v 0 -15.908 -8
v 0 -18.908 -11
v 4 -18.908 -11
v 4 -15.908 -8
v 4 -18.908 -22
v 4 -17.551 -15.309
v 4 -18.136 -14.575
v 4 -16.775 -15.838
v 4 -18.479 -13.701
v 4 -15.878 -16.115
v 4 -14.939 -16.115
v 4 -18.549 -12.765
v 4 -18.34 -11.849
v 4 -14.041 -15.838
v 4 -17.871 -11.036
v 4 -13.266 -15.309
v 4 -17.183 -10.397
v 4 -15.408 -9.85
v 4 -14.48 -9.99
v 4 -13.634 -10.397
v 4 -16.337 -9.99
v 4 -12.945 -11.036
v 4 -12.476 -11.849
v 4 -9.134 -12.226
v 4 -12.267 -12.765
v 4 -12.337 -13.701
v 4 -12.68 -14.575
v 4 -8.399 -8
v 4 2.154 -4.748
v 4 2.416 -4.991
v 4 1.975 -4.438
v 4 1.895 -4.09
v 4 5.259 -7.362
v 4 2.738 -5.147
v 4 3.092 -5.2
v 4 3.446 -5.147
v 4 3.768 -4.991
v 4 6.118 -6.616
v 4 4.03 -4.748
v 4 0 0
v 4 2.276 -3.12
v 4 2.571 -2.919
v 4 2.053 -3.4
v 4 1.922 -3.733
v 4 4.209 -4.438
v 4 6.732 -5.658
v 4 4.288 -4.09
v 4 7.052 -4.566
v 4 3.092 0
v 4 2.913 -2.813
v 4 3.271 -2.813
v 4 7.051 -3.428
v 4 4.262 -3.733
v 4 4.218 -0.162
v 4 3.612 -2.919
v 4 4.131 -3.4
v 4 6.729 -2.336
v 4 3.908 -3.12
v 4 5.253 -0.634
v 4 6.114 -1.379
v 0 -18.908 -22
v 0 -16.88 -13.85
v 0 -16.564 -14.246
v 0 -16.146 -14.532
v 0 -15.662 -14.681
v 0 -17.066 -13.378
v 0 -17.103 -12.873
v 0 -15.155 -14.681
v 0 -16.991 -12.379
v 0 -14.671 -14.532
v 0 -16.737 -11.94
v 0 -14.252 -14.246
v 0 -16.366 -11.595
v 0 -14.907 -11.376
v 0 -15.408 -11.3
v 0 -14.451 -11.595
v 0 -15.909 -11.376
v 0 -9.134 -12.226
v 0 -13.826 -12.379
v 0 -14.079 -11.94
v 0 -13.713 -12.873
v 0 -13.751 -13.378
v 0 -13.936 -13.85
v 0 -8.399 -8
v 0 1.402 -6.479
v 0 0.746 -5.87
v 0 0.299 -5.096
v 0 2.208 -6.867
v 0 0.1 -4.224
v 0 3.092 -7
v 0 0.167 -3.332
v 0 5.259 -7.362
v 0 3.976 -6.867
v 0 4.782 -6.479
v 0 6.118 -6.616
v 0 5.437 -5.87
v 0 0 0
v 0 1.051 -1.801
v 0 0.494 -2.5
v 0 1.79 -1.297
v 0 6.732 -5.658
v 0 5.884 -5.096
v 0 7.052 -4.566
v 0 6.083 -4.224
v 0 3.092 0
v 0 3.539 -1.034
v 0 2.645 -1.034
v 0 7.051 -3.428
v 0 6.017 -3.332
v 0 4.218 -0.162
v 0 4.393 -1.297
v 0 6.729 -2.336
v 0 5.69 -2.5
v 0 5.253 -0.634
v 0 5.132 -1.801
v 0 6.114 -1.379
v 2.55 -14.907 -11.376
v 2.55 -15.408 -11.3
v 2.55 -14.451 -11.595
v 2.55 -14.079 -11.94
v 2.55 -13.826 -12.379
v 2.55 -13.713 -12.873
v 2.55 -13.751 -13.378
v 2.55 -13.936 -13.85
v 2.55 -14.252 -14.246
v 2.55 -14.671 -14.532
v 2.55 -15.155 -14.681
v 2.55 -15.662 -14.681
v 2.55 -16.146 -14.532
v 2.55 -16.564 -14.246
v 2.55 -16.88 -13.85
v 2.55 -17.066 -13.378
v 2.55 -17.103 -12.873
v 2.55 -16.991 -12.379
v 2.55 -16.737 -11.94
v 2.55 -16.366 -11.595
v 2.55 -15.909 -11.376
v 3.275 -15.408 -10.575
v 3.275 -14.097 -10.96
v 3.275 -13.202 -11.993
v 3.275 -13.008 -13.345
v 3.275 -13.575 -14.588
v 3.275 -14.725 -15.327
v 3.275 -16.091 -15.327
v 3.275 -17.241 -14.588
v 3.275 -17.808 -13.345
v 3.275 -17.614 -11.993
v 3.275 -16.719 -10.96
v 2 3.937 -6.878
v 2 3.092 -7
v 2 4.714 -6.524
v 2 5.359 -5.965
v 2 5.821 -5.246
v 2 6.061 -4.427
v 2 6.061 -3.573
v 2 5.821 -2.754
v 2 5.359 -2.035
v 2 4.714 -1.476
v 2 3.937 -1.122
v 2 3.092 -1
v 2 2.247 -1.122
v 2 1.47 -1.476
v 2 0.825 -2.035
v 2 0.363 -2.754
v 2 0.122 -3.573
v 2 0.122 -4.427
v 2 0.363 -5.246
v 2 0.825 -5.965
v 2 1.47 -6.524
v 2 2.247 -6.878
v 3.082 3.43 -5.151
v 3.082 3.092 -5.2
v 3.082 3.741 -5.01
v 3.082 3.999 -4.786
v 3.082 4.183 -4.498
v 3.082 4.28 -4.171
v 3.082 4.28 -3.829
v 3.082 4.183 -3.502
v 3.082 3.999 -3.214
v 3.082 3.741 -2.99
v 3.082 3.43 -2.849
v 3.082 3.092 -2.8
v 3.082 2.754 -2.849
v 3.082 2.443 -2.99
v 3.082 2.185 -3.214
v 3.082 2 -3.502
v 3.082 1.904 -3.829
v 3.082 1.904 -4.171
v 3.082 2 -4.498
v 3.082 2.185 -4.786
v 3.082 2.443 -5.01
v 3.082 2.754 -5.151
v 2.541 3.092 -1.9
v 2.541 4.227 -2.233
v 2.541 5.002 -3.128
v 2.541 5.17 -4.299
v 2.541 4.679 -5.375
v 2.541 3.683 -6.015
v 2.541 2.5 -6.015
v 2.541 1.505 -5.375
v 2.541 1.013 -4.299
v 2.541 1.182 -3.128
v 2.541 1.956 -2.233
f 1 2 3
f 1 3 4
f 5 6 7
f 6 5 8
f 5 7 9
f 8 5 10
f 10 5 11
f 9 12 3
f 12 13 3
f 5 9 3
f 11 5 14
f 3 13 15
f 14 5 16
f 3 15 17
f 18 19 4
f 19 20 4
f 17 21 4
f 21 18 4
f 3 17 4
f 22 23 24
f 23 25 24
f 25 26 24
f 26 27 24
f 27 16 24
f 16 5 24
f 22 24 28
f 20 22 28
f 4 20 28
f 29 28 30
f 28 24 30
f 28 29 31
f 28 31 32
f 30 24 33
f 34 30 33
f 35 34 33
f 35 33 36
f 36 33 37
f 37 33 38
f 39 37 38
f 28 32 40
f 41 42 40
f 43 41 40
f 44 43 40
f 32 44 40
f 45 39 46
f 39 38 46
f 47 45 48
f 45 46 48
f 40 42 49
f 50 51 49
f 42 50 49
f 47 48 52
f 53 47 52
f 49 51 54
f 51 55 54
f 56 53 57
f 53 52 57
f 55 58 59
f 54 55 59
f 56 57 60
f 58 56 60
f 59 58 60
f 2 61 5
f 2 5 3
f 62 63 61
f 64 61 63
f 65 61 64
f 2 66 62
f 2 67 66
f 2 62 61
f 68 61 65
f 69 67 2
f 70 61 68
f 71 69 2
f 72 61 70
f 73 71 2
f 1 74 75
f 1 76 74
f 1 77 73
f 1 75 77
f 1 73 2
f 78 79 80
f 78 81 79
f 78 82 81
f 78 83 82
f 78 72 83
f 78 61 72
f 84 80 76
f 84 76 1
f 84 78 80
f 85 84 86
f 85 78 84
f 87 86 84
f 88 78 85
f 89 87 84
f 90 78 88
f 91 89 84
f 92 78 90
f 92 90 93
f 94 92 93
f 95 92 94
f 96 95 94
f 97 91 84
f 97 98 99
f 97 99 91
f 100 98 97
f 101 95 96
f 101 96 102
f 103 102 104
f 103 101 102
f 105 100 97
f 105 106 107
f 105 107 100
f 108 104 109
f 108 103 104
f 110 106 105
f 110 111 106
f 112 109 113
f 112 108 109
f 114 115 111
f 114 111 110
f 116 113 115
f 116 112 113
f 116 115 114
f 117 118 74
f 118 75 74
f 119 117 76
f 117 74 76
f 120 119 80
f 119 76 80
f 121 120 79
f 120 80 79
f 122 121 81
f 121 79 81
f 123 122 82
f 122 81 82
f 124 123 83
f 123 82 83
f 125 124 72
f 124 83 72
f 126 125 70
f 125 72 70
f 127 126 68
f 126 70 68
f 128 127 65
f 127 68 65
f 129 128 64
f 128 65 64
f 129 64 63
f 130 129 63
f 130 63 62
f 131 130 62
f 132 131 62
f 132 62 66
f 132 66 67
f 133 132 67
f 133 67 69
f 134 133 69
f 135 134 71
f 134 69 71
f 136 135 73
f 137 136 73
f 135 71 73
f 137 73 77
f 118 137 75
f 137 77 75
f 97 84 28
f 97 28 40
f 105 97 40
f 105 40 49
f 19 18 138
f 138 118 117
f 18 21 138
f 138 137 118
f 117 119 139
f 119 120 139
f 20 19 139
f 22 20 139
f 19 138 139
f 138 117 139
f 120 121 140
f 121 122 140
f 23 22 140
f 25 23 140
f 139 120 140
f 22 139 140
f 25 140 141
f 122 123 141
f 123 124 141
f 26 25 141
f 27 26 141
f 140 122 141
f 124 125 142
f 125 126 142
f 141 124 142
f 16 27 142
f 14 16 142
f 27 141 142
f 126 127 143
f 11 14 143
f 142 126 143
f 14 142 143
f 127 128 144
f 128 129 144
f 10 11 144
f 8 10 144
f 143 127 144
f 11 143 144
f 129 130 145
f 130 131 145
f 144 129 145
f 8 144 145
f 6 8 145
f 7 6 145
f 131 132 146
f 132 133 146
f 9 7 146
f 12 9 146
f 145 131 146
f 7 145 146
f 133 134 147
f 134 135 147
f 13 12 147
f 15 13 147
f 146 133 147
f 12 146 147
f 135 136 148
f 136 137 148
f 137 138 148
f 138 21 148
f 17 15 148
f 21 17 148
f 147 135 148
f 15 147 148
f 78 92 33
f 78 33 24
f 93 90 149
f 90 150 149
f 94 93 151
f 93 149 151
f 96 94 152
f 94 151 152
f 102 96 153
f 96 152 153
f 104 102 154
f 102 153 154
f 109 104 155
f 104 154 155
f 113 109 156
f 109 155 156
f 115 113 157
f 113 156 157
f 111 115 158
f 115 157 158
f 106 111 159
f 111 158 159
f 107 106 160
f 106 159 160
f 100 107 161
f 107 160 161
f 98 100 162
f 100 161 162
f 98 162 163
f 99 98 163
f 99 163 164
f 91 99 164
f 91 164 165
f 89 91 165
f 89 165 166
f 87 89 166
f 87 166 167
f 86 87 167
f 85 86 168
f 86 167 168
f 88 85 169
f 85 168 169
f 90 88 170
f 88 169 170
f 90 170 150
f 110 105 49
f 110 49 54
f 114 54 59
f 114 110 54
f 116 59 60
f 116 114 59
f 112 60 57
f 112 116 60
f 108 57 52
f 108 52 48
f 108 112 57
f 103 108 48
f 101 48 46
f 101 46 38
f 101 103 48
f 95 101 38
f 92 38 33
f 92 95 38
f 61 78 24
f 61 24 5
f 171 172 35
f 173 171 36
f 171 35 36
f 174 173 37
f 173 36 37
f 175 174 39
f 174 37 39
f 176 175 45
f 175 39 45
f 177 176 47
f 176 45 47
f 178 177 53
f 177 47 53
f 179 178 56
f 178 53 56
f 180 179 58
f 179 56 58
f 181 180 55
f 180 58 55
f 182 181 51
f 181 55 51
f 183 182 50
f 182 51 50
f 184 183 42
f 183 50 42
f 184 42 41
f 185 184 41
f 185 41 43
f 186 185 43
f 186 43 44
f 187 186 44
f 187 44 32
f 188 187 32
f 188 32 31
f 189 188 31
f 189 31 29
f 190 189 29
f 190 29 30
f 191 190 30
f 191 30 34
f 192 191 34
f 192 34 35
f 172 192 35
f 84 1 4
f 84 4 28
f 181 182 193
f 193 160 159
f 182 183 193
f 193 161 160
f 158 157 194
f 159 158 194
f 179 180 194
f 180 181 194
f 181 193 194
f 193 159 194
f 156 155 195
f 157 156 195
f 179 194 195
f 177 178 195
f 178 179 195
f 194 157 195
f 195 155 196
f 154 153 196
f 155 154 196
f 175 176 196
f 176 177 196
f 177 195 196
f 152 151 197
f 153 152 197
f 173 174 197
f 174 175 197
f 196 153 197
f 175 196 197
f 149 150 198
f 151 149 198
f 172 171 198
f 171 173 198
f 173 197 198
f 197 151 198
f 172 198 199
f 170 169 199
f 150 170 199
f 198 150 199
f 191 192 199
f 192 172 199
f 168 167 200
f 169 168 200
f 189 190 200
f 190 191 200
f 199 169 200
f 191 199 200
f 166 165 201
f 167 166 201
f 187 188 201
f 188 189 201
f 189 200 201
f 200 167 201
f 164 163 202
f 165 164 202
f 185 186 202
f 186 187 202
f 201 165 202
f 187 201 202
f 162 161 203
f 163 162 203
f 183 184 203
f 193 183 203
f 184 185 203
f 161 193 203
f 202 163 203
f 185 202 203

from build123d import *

# Parameters (mm, degrees)
RESSALTO_EXTRUS_O1_DEPTH                             = 4
FURO_DE_DI_METRO_6_0_6_1_D                           = 6
FURO_DE_DI_METRO_6_0_6_1_DEPTH                       = 2
FURO_DE_DI_METRO_6_0_6_1_TIP                         = 1.802581857
ESBO_O4_R                                            = 1.2
CORTE_EXTRUS_O1_DEPTH                                = 30.283417381
ESCAREADO_PARA_PARAFUSO_COM_CABE_A_ESCAR_D           = 3.4
ESCAREADO_PARA_PARAFUSO_COM_CABE_A_ESCAR_CSINK_D     = 6.3
ESCAREADO_PARA_PARAFUSO_COM_CABE_A_ESCAR_CSINK_ANGLE = 90


with BuildPart() as part:
    # Esboço1 → Ressalto-extrusão1 (new body)
    with BuildSketch(Plane(origin=(0, 0, 0), x_dir=(0, 0, -1), z_dir=(1, 0, 0))):
        with BuildLine():
            Line((0, 0), (0, 3.091839499))
            ThreePointArc((0, 3.091839499), (2.870368785, 6.92901728), (7.361966659, 5.259137398))
            Line((7.361966659, 5.259137398), (12.225984495, -9.134144996))
            Line((12.225984495, -9.134144996), (22, -18.908160501))
            Line((22, -18.908160501), (11, -18.908160501))
            Line((11, -18.908160501), (8, -15.908160501))
            Line((8, -15.908160501), (8, -8.399335203))
            Line((8, -8.399335203), (0, 0))
        make_face()
    extrude(amount=RESSALTO_EXTRUS_O1_DEPTH)

    # Furo de diâmetro Ø6.0 (6)1
    with Locations(Plane.ZY):
        with Locations((-4, 3.091839499)):
            Hole(FURO_DE_DI_METRO_6_0_6_1_D / 2, depth=FURO_DE_DI_METRO_6_0_6_1_DEPTH)
            with Locations((0, 0, -(FURO_DE_DI_METRO_6_0_6_1_DEPTH + FURO_DE_DI_METRO_6_0_6_1_TIP / 2))):  # 118° drill point
                Cone(0, FURO_DE_DI_METRO_6_0_6_1_D / 2, FURO_DE_DI_METRO_6_0_6_1_TIP, mode=Mode.SUBTRACT)

    # Esboço4 → Corte-extrusão1 (cut, through all)
    with BuildSketch(Plane(origin=(4, 0, 0), x_dir=(0, 0, -1), z_dir=(1, 0, 0))):
        with Locations((4, 3.091839499)):
            Circle(ESBO_O4_R)
    extrude(amount=-CORTE_EXTRUS_O1_DEPTH, mode=Mode.SUBTRACT)

    # Escareado para parafuso com cabeça escareada chata de M31 (through all)
    with Locations(Plane(origin=(4, 0, 0), x_dir=(0, 0, -1), z_dir=(1, 0, 0))):
        with Locations((13, -15.408160501)):
            CounterSinkHole(ESCAREADO_PARA_PARAFUSO_COM_CABE_A_ESCAR_D / 2, ESCAREADO_PARA_PARAFUSO_COM_CABE_A_ESCAR_CSINK_D / 2, counter_sink_angle=ESCAREADO_PARA_PARAFUSO_COM_CABE_A_ESCAR_CSINK_ANGLE)


solid = part.part
